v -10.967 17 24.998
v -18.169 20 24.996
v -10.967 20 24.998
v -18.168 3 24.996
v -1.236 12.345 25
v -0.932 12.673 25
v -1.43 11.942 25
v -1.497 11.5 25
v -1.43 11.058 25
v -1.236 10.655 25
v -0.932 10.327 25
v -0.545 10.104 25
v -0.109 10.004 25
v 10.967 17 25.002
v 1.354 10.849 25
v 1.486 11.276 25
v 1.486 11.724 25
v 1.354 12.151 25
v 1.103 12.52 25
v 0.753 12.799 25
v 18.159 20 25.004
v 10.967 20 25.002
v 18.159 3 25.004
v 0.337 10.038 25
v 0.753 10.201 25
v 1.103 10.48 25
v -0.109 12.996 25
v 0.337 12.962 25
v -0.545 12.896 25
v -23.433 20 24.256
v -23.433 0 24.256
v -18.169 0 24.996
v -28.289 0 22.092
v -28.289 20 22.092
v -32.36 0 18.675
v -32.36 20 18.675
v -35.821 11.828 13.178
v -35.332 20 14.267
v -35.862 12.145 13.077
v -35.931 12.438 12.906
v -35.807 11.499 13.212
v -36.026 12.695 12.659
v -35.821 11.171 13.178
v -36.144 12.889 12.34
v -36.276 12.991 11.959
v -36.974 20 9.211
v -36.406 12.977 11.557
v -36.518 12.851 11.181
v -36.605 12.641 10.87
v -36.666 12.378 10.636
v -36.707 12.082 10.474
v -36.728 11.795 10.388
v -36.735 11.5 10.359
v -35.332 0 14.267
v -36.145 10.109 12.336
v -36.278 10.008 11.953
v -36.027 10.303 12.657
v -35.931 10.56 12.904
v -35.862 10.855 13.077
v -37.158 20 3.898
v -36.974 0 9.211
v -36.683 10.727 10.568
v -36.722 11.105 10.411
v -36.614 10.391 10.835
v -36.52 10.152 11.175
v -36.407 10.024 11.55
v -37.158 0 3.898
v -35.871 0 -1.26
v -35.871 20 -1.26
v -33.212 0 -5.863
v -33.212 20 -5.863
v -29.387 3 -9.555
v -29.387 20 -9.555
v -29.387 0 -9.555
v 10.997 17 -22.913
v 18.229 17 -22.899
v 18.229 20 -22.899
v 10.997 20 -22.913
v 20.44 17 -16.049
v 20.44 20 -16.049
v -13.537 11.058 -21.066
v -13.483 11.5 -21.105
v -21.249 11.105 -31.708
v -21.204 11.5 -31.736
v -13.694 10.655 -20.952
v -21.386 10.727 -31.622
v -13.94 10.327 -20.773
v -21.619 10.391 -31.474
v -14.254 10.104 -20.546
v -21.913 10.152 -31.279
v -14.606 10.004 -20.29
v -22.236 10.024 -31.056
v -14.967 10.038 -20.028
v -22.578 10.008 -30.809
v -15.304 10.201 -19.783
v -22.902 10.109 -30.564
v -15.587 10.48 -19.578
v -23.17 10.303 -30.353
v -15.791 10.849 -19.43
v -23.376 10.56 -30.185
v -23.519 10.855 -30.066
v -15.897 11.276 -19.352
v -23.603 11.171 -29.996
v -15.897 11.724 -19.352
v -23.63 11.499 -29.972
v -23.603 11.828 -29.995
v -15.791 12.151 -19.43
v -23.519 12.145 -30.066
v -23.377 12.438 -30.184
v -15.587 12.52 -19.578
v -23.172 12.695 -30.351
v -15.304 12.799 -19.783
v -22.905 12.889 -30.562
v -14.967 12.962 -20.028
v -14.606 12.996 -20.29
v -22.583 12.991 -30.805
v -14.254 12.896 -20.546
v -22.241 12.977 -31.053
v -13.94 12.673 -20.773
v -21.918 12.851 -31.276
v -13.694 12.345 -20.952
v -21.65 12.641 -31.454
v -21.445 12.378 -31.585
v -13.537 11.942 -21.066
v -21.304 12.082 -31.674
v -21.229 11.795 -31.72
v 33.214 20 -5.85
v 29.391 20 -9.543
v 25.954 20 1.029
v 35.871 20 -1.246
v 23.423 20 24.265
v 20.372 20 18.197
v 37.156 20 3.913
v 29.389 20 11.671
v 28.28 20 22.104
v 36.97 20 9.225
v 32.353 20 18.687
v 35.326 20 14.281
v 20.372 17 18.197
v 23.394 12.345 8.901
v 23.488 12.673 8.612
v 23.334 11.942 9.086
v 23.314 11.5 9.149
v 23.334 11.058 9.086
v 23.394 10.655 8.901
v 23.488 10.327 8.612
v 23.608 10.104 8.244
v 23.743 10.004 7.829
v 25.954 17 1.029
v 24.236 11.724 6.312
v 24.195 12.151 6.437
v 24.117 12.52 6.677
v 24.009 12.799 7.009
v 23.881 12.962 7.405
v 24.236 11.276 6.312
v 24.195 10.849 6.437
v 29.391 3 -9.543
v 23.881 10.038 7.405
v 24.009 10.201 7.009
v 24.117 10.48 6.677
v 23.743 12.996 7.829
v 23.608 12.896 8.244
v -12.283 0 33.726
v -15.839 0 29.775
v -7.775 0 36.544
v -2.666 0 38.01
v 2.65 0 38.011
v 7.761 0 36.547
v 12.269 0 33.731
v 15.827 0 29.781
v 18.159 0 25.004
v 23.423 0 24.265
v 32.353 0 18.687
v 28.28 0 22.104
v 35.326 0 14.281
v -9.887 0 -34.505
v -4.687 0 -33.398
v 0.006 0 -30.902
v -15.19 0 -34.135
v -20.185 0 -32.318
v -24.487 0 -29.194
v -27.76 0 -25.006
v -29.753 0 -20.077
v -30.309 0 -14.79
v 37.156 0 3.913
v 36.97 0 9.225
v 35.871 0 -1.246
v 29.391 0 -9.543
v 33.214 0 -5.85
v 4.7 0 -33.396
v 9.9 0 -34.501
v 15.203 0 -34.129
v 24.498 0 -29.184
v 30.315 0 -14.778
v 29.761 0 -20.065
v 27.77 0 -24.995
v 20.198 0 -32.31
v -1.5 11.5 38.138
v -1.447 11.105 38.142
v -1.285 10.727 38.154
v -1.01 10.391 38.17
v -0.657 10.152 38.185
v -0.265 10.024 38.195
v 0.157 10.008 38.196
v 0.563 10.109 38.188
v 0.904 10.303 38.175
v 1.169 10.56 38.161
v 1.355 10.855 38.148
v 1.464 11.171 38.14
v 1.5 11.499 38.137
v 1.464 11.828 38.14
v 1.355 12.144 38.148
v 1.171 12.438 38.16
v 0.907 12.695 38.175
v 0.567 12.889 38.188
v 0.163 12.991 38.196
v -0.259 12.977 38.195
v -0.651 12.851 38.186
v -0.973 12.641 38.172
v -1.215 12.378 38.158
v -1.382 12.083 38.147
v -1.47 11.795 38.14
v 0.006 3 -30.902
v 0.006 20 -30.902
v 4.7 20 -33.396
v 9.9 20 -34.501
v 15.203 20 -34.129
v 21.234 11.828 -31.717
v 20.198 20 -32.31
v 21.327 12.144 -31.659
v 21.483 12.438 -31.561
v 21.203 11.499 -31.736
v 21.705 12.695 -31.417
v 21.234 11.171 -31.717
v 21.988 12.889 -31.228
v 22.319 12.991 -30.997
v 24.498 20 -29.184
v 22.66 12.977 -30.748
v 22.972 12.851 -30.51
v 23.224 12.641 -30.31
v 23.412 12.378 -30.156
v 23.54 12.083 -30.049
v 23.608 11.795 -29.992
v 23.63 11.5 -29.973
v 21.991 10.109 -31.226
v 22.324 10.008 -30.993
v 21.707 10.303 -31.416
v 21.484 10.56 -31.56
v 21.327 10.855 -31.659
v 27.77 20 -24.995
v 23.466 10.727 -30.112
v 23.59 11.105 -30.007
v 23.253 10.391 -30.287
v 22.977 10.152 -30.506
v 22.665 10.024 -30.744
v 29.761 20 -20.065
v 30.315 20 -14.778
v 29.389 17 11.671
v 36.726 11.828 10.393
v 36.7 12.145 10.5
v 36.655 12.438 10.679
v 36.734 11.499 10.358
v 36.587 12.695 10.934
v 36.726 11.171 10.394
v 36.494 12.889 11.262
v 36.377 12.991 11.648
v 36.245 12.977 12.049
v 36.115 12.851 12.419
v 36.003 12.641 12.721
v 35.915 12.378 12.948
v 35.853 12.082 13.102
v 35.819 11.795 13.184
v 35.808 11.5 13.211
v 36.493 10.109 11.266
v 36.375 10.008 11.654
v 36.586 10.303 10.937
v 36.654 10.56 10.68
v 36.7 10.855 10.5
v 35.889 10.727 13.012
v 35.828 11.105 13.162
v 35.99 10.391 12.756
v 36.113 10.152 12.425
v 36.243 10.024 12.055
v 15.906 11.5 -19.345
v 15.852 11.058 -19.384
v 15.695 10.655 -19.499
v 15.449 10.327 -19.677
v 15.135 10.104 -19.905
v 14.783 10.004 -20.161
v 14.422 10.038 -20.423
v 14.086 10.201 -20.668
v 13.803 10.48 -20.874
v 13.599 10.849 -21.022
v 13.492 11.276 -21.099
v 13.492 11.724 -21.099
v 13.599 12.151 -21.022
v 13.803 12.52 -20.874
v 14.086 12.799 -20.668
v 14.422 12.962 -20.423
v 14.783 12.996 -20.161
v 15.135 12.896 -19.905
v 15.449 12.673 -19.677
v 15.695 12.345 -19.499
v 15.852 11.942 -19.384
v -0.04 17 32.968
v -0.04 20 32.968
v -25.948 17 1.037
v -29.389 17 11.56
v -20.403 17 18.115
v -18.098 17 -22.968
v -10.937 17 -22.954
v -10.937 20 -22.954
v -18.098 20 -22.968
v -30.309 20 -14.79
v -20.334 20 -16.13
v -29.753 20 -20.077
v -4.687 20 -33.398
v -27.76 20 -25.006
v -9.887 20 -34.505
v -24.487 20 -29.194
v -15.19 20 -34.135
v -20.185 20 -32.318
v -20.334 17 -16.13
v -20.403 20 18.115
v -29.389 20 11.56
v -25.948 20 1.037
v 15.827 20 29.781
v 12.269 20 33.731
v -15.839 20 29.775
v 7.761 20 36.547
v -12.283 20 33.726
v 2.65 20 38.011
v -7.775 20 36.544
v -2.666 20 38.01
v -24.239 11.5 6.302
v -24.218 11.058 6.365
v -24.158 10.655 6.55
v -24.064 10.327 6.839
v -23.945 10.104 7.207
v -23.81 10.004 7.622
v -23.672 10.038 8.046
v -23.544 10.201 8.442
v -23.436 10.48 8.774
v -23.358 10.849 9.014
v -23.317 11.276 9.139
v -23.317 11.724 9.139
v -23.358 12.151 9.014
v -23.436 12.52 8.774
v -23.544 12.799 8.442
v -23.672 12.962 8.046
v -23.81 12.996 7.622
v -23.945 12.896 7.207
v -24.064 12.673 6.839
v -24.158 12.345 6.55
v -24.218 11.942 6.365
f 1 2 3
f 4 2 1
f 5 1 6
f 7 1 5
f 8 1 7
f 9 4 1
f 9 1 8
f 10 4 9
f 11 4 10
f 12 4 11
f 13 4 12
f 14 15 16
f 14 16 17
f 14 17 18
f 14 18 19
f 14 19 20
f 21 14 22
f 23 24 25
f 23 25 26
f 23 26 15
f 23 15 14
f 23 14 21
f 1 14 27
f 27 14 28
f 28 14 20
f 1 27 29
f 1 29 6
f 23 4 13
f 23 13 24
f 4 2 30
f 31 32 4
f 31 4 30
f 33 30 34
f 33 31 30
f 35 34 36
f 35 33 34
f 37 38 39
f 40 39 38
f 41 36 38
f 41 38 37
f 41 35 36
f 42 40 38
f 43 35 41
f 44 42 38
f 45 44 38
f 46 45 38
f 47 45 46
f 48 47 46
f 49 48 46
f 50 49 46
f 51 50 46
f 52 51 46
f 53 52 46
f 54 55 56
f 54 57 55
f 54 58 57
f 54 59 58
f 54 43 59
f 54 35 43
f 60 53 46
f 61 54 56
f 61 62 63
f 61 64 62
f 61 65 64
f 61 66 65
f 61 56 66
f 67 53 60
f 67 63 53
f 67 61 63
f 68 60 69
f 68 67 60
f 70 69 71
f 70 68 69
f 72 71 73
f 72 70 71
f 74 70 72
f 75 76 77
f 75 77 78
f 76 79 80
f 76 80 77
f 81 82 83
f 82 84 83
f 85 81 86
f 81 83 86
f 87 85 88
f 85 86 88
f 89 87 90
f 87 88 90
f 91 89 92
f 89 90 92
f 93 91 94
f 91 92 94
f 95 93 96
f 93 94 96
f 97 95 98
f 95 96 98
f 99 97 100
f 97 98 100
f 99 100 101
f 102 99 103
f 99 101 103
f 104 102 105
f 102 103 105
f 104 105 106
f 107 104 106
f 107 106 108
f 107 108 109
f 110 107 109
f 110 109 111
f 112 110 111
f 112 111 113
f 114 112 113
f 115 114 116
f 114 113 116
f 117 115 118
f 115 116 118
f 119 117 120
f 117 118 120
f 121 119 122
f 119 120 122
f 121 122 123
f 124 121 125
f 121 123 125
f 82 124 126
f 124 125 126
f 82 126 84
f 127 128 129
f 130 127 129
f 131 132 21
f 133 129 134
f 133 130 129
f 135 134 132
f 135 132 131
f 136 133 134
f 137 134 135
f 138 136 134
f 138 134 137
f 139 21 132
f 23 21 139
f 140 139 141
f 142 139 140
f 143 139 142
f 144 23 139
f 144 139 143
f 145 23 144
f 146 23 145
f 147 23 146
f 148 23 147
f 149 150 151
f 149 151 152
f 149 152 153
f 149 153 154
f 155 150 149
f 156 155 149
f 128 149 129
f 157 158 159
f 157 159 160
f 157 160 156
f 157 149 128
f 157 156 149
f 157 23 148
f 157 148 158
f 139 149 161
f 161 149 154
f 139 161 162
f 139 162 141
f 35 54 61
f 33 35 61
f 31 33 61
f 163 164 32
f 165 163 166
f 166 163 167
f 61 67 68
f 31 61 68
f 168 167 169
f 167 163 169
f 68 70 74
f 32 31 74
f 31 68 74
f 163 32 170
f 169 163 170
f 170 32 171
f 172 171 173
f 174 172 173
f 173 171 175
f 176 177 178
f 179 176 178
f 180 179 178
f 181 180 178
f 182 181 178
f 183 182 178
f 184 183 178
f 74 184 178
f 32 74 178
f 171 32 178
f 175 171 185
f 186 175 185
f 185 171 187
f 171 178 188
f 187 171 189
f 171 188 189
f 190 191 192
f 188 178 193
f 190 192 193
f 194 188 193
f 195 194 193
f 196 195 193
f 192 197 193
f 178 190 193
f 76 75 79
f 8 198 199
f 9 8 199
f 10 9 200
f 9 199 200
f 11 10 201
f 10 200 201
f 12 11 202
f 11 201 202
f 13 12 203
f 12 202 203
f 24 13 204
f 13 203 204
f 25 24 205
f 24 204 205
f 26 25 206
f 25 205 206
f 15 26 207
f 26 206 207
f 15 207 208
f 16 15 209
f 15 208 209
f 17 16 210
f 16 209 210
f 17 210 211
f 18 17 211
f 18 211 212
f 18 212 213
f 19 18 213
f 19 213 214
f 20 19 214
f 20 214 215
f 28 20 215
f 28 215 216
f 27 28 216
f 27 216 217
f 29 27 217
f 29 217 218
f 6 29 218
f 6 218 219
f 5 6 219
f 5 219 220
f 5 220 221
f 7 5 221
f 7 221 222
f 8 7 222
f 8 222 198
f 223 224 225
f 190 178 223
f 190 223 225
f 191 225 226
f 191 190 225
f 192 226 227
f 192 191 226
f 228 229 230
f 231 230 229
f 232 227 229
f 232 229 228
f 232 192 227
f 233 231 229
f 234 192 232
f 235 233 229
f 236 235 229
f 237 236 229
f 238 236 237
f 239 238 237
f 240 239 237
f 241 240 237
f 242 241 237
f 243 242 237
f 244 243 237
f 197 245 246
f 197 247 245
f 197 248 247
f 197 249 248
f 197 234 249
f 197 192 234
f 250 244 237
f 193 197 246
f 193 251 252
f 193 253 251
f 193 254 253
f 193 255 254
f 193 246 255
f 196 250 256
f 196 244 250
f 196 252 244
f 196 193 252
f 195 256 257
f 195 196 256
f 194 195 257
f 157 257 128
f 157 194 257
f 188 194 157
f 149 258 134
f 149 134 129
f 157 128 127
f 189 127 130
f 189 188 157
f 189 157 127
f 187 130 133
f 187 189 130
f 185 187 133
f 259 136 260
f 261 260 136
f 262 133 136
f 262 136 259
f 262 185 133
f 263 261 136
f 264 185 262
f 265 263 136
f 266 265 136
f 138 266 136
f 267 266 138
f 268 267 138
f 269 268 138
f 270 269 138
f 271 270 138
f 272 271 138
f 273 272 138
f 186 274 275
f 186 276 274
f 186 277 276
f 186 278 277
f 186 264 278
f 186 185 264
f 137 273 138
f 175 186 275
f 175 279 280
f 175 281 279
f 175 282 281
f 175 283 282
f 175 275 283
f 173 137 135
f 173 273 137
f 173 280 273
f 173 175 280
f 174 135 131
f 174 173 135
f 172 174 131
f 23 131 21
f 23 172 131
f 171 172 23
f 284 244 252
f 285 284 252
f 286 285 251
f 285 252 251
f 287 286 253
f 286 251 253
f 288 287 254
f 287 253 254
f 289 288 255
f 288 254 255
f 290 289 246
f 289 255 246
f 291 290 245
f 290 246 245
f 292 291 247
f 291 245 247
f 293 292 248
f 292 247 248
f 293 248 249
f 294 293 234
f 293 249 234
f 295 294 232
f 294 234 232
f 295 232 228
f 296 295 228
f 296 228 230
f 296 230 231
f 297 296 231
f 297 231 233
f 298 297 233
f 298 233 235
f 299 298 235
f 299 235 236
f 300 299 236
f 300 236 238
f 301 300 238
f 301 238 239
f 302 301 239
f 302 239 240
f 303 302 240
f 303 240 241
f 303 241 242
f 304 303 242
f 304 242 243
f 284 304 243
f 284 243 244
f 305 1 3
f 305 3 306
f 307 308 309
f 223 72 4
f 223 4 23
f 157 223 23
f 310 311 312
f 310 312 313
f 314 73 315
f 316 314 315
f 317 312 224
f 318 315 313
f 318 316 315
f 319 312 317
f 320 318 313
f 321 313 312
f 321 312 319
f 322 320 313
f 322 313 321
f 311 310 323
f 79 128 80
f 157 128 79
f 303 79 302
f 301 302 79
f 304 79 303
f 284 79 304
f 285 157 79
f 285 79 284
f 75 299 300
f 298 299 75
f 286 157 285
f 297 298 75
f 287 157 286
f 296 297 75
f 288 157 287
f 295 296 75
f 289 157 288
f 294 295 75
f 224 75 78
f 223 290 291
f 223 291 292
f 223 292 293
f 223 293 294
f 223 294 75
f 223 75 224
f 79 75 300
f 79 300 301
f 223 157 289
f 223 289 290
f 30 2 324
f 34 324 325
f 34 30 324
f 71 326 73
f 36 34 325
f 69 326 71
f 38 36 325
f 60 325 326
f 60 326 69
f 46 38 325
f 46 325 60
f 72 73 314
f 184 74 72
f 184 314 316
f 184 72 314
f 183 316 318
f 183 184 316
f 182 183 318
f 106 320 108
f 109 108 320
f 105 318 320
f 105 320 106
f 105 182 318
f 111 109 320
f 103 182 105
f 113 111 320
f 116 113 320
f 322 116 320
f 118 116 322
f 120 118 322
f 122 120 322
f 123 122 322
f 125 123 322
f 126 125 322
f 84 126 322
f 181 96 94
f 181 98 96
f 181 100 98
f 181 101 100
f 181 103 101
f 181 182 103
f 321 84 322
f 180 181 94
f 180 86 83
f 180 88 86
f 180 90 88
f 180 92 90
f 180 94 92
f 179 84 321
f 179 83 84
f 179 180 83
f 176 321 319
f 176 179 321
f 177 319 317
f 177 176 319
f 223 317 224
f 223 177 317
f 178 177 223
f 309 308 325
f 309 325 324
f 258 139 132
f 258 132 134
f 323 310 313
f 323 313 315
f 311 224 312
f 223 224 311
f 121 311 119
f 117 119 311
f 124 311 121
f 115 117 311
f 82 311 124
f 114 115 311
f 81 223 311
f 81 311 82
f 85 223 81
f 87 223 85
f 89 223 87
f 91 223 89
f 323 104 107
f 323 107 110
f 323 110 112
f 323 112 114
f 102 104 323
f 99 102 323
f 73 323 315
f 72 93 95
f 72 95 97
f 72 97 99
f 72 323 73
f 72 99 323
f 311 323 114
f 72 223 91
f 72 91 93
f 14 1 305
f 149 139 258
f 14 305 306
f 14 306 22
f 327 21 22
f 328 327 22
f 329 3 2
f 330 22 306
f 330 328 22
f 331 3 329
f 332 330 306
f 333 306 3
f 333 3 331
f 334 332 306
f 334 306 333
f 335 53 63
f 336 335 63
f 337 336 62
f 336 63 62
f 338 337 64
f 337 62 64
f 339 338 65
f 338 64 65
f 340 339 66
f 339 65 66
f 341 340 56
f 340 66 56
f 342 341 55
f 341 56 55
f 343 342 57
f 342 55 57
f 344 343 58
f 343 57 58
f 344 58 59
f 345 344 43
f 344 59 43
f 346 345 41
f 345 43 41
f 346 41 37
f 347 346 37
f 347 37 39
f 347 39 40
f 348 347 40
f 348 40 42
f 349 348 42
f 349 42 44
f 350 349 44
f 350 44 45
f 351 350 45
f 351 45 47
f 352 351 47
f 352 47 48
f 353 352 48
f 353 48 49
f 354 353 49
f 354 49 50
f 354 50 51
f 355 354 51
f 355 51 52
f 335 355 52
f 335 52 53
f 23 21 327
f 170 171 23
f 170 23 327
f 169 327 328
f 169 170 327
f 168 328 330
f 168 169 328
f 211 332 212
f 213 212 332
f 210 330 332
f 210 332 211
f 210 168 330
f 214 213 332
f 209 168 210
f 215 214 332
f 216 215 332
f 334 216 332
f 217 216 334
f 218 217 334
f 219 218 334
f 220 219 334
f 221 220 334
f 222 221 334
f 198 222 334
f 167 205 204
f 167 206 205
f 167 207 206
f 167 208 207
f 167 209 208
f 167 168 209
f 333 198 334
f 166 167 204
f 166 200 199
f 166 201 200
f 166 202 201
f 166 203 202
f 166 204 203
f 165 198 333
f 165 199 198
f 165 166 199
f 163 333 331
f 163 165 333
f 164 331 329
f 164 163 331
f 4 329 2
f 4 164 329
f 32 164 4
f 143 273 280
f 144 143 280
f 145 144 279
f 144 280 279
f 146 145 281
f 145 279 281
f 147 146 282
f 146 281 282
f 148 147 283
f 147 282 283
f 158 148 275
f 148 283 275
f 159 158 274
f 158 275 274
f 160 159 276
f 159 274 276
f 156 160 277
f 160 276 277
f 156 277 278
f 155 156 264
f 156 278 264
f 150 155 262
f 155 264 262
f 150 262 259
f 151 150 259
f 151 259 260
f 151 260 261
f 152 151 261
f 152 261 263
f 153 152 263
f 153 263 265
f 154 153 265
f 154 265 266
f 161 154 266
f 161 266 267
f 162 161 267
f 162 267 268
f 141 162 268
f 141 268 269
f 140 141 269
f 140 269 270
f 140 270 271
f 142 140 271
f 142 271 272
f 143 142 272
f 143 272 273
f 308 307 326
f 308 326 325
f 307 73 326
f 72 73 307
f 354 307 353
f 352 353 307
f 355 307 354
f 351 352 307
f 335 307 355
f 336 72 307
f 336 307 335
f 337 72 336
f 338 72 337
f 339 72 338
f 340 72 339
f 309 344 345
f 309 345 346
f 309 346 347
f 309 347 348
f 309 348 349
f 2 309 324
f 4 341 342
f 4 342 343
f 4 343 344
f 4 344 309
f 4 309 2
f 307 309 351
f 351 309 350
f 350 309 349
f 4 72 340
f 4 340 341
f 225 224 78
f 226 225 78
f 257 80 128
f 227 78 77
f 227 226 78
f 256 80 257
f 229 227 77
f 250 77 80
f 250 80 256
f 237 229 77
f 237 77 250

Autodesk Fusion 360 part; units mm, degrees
sketch "草图1" plane through (0, 0, 0) normal (0, 1, 0) x (1, 0, 0)
  circle A0 centre (0, 0) radius 15
  line L0 (18.1586, -25.0036) -> (29.3912, 9.5433)
  line L1 (29.3912, 9.5433) -> (0.0061, 30.9017)
  line L2 (0.0061, 30.9017) -> (-29.3874, 9.555)
  line L3 (-29.3874, 9.555) -> (-18.1685, -24.9964)
  line L4 (-18.1685, -24.9964) -> (18.1586, -25.0036)
  arc A1 (29.3912, 9.5433) -> (0.0061, 30.9017) centre (11.2288, 15.4486) ccw
  dimension "d1" = 30
  dimension "d2" = 25
extrude "拉伸1" add sketch "草图1" along normal blind 20 contours L1 A1 makes body 1
pattern_circular "C-阵列1" count 5 over 360 about axis through (0, 0, 0) along (0, 1, 0) of bodies 1 makes body 2 at (-14.2646, 13.3333, -34.3076) makes body 3 at (-31.7135, 13.3333, 19.3583) makes body 4 at (8.6108, 13.3333, 36.1433) makes body 5 at (19.0994, 6.6667, 24.9806)
extrude "拉伸2" add sketch "草图1" along normal blind 3 contours A0 | L0 L1 L2 L3 L4 bodies 1 2 3 4 5
cylinder "圆柱体基本要素1" add diameter 3 height 60 placed x (1, 0, 0) y (0, 1, 0) z (0, 0, 1) at (90, 0, 0) separate body makes body 6
move_body "对齐1" bodies 6 to x (-1, 0, -0.000199) y (0, -1, 0) z (-0.000199, 0, 1) at (90.007, 11.5, -34.9821)
move_body "移动1" bodies 6 to x (1, 0, 0) y (0, 1, 0) z (0, 0, 1) at (0, 0, 40)
pattern_circular "C-阵列2" count 5 over 360 about axis through (0, 0, 0) along (0, 1, 0) of bodies 6 makes body 7 at (42.3357, 11.6494, 15.3261) makes body 8 at (14.8431, 10.0116, -20.1175) makes body 9 at (-13.894, 10.3753, -20.8069) makes body 10 at (-23.5242, 12.76, 8.5023)
combine "合并1" operation cut target body 1 tool bodies 6 8 10 9 7
sketch "草图3" plane through (0, 0, 0) normal (0, 1, 0) x (1, 0, 0)
  line L0 (69.9416, -30.9016) -> (99.3712, -9.6047)
  line L1 (99.3712, -9.6047) -> (88.2108, 24.9656)
  line L2 (88.2108, 24.9656) -> (51.8837, 25.0343)
  line L3 (51.8837, 25.0343) -> (40.5927, -9.4936)
  line L4 (40.5927, -9.4936) -> (69.9416, -30.9016)
  point P0 (70, 0)
  dimension "d13" = 25
extrude "拉伸3" add sketch "草图3" along normal blind 3 separate body makes body 11
move_body "对齐2" bodies 11 to x (1, 0, 0) y (0, 1, 0) z (0, 0, 1) at (-69.9819, -3, -2.9337)
move_body "移动2" bodies 11 to x (1, 0, 0) y (0, 1, 0) z (0, 0, 1) at (0, 20, 0)
move_body "移动3" bodies 11 to x (1, 0, 0) y (0, 1, 0) z (0, 0, 1) at (0, 0, 5)
combine "合并2" operation cut target body 1 tool bodies 11
